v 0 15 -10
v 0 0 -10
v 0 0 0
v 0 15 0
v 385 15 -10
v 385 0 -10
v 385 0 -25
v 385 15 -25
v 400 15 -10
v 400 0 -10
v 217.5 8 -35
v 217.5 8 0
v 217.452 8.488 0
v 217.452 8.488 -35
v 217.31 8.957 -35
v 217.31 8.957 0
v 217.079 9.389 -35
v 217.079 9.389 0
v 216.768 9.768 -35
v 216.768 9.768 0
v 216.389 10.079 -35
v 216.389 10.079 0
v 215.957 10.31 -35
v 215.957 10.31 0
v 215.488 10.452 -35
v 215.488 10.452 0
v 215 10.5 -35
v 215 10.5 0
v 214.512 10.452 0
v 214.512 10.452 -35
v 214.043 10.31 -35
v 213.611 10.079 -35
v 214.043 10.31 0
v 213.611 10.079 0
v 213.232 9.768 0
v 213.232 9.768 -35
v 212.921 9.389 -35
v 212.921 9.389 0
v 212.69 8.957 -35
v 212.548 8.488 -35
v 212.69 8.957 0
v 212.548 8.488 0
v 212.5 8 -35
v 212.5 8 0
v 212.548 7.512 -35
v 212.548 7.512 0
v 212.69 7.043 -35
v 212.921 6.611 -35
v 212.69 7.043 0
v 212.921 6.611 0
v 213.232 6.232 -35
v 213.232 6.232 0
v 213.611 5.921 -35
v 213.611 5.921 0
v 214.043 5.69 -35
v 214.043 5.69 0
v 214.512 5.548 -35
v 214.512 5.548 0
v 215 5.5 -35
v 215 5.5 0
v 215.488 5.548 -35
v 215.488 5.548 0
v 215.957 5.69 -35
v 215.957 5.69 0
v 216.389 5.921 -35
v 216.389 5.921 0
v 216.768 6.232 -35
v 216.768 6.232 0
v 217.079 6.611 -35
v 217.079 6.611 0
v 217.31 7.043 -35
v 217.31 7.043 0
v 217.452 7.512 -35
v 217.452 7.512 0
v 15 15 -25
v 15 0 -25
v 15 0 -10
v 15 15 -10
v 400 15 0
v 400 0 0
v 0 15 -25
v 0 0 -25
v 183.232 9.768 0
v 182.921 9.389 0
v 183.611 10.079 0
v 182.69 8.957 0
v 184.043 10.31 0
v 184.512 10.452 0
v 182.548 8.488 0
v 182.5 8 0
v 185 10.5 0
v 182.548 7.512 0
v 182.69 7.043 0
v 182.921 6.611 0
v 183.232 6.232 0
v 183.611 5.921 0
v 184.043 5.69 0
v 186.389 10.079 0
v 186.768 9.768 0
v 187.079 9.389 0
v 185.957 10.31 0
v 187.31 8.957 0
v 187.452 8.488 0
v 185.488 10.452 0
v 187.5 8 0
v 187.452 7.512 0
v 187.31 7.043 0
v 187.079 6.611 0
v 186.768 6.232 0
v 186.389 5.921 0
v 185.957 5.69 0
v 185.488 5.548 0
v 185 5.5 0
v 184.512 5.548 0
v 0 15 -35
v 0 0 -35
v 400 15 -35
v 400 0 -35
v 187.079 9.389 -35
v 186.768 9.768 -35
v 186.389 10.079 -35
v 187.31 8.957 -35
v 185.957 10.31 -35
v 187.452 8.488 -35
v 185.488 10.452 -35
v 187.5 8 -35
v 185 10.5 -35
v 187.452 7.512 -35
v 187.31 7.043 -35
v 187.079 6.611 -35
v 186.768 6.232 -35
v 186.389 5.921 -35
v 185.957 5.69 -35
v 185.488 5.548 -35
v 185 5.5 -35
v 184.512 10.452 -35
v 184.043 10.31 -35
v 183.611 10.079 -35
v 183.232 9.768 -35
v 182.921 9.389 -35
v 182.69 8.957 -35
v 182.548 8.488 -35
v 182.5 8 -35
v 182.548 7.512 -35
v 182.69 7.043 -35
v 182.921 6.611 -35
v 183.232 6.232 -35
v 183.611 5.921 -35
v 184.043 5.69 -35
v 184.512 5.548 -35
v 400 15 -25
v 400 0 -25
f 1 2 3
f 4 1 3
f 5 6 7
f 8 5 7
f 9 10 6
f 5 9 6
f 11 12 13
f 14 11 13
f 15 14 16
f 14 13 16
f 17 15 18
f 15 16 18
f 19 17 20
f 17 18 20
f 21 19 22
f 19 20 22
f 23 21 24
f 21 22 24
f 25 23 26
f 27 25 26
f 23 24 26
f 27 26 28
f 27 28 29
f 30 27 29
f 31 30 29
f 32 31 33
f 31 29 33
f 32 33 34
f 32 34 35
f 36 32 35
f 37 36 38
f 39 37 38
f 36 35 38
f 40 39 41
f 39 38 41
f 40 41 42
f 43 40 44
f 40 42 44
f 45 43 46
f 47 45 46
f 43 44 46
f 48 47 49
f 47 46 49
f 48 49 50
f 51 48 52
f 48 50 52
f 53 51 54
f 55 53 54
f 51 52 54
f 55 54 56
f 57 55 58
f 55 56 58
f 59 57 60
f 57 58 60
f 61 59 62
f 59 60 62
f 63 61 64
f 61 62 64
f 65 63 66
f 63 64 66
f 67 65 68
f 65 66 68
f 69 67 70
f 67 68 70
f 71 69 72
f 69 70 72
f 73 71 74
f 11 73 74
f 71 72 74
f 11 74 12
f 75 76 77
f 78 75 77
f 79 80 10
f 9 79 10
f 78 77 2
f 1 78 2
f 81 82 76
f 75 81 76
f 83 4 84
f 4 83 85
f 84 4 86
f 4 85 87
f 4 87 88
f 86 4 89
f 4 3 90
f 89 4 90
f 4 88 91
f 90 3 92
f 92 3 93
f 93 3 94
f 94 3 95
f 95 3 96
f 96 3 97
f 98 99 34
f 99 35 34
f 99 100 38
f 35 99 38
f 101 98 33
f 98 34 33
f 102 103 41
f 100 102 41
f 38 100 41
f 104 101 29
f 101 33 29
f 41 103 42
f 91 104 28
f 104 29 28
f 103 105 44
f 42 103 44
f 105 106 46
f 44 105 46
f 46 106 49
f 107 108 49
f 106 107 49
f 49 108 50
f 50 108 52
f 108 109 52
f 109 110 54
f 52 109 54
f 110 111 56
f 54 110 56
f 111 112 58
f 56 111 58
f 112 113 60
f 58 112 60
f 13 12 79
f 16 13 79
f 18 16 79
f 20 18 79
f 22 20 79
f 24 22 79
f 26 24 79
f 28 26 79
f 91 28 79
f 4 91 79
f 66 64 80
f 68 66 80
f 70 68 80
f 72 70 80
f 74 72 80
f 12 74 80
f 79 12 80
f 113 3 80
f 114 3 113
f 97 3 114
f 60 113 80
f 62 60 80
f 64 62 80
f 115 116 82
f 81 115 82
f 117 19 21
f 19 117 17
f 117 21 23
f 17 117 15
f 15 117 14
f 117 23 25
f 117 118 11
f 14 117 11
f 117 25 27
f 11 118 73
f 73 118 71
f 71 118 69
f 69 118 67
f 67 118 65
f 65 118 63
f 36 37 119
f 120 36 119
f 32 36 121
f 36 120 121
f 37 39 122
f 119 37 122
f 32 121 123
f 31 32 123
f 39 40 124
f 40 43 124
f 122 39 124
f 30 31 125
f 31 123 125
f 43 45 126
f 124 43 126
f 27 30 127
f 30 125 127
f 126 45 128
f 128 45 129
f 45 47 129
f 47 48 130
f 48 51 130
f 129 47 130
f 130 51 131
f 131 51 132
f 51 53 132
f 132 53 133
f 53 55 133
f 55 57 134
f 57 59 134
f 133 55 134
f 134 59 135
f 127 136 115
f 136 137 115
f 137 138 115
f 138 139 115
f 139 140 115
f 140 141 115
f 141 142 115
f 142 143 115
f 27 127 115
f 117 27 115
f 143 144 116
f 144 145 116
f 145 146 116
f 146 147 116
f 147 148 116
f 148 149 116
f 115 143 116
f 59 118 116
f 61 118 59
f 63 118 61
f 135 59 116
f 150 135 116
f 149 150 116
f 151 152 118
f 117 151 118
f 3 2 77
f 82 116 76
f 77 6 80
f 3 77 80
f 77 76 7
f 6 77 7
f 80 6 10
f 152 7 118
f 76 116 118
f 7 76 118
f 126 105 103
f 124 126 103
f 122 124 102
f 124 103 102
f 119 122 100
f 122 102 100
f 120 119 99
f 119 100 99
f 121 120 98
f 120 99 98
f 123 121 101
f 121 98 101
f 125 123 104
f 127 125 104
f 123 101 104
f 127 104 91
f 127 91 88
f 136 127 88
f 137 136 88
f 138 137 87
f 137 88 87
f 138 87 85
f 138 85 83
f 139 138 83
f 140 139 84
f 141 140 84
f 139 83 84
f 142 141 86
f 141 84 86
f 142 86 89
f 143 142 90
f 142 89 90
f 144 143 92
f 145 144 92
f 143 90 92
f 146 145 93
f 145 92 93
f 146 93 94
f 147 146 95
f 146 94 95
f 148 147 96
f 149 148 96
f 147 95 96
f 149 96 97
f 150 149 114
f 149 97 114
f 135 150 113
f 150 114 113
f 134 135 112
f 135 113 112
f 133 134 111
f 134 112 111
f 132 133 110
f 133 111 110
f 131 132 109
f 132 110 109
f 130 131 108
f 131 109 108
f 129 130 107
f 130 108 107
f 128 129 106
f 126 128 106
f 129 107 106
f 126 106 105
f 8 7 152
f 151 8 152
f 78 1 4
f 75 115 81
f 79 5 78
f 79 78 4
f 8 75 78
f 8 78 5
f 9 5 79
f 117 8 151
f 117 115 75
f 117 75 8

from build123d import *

# Parameters (mm, degrees)
EXTRUDE_1_DEPTH     = 15
SKETCH_4_R          = 2.5
CUT_EXTRUDE_1_DEPTH = 35


with BuildPart() as part:
    # 草图3 → 凸台-拉伸1 (new body)
    with BuildSketch(Plane(origin=(0, 0, 0), x_dir=(1, 0, 0), z_dir=(0, 1, 0))):
        Polygon((0, 0), (400, 0), (400, 10), (385, 10), (385, 25), (400, 25), (400, 35), (0, 35), (0, 25), (15, 25), (15, 10), (0, 10), align=None)
    extrude(amount=EXTRUDE_1_DEPTH)

    # 草图4 → 切除-拉伸1 (cut)
    with BuildSketch(Plane.XY):
        with Locations((185, 8)):
            Circle(SKETCH_4_R)
        with Locations((215, 8)):
            Circle(SKETCH_4_R)
    extrude(amount=-CUT_EXTRUDE_1_DEPTH, mode=Mode.SUBTRACT)


solid = part.part
